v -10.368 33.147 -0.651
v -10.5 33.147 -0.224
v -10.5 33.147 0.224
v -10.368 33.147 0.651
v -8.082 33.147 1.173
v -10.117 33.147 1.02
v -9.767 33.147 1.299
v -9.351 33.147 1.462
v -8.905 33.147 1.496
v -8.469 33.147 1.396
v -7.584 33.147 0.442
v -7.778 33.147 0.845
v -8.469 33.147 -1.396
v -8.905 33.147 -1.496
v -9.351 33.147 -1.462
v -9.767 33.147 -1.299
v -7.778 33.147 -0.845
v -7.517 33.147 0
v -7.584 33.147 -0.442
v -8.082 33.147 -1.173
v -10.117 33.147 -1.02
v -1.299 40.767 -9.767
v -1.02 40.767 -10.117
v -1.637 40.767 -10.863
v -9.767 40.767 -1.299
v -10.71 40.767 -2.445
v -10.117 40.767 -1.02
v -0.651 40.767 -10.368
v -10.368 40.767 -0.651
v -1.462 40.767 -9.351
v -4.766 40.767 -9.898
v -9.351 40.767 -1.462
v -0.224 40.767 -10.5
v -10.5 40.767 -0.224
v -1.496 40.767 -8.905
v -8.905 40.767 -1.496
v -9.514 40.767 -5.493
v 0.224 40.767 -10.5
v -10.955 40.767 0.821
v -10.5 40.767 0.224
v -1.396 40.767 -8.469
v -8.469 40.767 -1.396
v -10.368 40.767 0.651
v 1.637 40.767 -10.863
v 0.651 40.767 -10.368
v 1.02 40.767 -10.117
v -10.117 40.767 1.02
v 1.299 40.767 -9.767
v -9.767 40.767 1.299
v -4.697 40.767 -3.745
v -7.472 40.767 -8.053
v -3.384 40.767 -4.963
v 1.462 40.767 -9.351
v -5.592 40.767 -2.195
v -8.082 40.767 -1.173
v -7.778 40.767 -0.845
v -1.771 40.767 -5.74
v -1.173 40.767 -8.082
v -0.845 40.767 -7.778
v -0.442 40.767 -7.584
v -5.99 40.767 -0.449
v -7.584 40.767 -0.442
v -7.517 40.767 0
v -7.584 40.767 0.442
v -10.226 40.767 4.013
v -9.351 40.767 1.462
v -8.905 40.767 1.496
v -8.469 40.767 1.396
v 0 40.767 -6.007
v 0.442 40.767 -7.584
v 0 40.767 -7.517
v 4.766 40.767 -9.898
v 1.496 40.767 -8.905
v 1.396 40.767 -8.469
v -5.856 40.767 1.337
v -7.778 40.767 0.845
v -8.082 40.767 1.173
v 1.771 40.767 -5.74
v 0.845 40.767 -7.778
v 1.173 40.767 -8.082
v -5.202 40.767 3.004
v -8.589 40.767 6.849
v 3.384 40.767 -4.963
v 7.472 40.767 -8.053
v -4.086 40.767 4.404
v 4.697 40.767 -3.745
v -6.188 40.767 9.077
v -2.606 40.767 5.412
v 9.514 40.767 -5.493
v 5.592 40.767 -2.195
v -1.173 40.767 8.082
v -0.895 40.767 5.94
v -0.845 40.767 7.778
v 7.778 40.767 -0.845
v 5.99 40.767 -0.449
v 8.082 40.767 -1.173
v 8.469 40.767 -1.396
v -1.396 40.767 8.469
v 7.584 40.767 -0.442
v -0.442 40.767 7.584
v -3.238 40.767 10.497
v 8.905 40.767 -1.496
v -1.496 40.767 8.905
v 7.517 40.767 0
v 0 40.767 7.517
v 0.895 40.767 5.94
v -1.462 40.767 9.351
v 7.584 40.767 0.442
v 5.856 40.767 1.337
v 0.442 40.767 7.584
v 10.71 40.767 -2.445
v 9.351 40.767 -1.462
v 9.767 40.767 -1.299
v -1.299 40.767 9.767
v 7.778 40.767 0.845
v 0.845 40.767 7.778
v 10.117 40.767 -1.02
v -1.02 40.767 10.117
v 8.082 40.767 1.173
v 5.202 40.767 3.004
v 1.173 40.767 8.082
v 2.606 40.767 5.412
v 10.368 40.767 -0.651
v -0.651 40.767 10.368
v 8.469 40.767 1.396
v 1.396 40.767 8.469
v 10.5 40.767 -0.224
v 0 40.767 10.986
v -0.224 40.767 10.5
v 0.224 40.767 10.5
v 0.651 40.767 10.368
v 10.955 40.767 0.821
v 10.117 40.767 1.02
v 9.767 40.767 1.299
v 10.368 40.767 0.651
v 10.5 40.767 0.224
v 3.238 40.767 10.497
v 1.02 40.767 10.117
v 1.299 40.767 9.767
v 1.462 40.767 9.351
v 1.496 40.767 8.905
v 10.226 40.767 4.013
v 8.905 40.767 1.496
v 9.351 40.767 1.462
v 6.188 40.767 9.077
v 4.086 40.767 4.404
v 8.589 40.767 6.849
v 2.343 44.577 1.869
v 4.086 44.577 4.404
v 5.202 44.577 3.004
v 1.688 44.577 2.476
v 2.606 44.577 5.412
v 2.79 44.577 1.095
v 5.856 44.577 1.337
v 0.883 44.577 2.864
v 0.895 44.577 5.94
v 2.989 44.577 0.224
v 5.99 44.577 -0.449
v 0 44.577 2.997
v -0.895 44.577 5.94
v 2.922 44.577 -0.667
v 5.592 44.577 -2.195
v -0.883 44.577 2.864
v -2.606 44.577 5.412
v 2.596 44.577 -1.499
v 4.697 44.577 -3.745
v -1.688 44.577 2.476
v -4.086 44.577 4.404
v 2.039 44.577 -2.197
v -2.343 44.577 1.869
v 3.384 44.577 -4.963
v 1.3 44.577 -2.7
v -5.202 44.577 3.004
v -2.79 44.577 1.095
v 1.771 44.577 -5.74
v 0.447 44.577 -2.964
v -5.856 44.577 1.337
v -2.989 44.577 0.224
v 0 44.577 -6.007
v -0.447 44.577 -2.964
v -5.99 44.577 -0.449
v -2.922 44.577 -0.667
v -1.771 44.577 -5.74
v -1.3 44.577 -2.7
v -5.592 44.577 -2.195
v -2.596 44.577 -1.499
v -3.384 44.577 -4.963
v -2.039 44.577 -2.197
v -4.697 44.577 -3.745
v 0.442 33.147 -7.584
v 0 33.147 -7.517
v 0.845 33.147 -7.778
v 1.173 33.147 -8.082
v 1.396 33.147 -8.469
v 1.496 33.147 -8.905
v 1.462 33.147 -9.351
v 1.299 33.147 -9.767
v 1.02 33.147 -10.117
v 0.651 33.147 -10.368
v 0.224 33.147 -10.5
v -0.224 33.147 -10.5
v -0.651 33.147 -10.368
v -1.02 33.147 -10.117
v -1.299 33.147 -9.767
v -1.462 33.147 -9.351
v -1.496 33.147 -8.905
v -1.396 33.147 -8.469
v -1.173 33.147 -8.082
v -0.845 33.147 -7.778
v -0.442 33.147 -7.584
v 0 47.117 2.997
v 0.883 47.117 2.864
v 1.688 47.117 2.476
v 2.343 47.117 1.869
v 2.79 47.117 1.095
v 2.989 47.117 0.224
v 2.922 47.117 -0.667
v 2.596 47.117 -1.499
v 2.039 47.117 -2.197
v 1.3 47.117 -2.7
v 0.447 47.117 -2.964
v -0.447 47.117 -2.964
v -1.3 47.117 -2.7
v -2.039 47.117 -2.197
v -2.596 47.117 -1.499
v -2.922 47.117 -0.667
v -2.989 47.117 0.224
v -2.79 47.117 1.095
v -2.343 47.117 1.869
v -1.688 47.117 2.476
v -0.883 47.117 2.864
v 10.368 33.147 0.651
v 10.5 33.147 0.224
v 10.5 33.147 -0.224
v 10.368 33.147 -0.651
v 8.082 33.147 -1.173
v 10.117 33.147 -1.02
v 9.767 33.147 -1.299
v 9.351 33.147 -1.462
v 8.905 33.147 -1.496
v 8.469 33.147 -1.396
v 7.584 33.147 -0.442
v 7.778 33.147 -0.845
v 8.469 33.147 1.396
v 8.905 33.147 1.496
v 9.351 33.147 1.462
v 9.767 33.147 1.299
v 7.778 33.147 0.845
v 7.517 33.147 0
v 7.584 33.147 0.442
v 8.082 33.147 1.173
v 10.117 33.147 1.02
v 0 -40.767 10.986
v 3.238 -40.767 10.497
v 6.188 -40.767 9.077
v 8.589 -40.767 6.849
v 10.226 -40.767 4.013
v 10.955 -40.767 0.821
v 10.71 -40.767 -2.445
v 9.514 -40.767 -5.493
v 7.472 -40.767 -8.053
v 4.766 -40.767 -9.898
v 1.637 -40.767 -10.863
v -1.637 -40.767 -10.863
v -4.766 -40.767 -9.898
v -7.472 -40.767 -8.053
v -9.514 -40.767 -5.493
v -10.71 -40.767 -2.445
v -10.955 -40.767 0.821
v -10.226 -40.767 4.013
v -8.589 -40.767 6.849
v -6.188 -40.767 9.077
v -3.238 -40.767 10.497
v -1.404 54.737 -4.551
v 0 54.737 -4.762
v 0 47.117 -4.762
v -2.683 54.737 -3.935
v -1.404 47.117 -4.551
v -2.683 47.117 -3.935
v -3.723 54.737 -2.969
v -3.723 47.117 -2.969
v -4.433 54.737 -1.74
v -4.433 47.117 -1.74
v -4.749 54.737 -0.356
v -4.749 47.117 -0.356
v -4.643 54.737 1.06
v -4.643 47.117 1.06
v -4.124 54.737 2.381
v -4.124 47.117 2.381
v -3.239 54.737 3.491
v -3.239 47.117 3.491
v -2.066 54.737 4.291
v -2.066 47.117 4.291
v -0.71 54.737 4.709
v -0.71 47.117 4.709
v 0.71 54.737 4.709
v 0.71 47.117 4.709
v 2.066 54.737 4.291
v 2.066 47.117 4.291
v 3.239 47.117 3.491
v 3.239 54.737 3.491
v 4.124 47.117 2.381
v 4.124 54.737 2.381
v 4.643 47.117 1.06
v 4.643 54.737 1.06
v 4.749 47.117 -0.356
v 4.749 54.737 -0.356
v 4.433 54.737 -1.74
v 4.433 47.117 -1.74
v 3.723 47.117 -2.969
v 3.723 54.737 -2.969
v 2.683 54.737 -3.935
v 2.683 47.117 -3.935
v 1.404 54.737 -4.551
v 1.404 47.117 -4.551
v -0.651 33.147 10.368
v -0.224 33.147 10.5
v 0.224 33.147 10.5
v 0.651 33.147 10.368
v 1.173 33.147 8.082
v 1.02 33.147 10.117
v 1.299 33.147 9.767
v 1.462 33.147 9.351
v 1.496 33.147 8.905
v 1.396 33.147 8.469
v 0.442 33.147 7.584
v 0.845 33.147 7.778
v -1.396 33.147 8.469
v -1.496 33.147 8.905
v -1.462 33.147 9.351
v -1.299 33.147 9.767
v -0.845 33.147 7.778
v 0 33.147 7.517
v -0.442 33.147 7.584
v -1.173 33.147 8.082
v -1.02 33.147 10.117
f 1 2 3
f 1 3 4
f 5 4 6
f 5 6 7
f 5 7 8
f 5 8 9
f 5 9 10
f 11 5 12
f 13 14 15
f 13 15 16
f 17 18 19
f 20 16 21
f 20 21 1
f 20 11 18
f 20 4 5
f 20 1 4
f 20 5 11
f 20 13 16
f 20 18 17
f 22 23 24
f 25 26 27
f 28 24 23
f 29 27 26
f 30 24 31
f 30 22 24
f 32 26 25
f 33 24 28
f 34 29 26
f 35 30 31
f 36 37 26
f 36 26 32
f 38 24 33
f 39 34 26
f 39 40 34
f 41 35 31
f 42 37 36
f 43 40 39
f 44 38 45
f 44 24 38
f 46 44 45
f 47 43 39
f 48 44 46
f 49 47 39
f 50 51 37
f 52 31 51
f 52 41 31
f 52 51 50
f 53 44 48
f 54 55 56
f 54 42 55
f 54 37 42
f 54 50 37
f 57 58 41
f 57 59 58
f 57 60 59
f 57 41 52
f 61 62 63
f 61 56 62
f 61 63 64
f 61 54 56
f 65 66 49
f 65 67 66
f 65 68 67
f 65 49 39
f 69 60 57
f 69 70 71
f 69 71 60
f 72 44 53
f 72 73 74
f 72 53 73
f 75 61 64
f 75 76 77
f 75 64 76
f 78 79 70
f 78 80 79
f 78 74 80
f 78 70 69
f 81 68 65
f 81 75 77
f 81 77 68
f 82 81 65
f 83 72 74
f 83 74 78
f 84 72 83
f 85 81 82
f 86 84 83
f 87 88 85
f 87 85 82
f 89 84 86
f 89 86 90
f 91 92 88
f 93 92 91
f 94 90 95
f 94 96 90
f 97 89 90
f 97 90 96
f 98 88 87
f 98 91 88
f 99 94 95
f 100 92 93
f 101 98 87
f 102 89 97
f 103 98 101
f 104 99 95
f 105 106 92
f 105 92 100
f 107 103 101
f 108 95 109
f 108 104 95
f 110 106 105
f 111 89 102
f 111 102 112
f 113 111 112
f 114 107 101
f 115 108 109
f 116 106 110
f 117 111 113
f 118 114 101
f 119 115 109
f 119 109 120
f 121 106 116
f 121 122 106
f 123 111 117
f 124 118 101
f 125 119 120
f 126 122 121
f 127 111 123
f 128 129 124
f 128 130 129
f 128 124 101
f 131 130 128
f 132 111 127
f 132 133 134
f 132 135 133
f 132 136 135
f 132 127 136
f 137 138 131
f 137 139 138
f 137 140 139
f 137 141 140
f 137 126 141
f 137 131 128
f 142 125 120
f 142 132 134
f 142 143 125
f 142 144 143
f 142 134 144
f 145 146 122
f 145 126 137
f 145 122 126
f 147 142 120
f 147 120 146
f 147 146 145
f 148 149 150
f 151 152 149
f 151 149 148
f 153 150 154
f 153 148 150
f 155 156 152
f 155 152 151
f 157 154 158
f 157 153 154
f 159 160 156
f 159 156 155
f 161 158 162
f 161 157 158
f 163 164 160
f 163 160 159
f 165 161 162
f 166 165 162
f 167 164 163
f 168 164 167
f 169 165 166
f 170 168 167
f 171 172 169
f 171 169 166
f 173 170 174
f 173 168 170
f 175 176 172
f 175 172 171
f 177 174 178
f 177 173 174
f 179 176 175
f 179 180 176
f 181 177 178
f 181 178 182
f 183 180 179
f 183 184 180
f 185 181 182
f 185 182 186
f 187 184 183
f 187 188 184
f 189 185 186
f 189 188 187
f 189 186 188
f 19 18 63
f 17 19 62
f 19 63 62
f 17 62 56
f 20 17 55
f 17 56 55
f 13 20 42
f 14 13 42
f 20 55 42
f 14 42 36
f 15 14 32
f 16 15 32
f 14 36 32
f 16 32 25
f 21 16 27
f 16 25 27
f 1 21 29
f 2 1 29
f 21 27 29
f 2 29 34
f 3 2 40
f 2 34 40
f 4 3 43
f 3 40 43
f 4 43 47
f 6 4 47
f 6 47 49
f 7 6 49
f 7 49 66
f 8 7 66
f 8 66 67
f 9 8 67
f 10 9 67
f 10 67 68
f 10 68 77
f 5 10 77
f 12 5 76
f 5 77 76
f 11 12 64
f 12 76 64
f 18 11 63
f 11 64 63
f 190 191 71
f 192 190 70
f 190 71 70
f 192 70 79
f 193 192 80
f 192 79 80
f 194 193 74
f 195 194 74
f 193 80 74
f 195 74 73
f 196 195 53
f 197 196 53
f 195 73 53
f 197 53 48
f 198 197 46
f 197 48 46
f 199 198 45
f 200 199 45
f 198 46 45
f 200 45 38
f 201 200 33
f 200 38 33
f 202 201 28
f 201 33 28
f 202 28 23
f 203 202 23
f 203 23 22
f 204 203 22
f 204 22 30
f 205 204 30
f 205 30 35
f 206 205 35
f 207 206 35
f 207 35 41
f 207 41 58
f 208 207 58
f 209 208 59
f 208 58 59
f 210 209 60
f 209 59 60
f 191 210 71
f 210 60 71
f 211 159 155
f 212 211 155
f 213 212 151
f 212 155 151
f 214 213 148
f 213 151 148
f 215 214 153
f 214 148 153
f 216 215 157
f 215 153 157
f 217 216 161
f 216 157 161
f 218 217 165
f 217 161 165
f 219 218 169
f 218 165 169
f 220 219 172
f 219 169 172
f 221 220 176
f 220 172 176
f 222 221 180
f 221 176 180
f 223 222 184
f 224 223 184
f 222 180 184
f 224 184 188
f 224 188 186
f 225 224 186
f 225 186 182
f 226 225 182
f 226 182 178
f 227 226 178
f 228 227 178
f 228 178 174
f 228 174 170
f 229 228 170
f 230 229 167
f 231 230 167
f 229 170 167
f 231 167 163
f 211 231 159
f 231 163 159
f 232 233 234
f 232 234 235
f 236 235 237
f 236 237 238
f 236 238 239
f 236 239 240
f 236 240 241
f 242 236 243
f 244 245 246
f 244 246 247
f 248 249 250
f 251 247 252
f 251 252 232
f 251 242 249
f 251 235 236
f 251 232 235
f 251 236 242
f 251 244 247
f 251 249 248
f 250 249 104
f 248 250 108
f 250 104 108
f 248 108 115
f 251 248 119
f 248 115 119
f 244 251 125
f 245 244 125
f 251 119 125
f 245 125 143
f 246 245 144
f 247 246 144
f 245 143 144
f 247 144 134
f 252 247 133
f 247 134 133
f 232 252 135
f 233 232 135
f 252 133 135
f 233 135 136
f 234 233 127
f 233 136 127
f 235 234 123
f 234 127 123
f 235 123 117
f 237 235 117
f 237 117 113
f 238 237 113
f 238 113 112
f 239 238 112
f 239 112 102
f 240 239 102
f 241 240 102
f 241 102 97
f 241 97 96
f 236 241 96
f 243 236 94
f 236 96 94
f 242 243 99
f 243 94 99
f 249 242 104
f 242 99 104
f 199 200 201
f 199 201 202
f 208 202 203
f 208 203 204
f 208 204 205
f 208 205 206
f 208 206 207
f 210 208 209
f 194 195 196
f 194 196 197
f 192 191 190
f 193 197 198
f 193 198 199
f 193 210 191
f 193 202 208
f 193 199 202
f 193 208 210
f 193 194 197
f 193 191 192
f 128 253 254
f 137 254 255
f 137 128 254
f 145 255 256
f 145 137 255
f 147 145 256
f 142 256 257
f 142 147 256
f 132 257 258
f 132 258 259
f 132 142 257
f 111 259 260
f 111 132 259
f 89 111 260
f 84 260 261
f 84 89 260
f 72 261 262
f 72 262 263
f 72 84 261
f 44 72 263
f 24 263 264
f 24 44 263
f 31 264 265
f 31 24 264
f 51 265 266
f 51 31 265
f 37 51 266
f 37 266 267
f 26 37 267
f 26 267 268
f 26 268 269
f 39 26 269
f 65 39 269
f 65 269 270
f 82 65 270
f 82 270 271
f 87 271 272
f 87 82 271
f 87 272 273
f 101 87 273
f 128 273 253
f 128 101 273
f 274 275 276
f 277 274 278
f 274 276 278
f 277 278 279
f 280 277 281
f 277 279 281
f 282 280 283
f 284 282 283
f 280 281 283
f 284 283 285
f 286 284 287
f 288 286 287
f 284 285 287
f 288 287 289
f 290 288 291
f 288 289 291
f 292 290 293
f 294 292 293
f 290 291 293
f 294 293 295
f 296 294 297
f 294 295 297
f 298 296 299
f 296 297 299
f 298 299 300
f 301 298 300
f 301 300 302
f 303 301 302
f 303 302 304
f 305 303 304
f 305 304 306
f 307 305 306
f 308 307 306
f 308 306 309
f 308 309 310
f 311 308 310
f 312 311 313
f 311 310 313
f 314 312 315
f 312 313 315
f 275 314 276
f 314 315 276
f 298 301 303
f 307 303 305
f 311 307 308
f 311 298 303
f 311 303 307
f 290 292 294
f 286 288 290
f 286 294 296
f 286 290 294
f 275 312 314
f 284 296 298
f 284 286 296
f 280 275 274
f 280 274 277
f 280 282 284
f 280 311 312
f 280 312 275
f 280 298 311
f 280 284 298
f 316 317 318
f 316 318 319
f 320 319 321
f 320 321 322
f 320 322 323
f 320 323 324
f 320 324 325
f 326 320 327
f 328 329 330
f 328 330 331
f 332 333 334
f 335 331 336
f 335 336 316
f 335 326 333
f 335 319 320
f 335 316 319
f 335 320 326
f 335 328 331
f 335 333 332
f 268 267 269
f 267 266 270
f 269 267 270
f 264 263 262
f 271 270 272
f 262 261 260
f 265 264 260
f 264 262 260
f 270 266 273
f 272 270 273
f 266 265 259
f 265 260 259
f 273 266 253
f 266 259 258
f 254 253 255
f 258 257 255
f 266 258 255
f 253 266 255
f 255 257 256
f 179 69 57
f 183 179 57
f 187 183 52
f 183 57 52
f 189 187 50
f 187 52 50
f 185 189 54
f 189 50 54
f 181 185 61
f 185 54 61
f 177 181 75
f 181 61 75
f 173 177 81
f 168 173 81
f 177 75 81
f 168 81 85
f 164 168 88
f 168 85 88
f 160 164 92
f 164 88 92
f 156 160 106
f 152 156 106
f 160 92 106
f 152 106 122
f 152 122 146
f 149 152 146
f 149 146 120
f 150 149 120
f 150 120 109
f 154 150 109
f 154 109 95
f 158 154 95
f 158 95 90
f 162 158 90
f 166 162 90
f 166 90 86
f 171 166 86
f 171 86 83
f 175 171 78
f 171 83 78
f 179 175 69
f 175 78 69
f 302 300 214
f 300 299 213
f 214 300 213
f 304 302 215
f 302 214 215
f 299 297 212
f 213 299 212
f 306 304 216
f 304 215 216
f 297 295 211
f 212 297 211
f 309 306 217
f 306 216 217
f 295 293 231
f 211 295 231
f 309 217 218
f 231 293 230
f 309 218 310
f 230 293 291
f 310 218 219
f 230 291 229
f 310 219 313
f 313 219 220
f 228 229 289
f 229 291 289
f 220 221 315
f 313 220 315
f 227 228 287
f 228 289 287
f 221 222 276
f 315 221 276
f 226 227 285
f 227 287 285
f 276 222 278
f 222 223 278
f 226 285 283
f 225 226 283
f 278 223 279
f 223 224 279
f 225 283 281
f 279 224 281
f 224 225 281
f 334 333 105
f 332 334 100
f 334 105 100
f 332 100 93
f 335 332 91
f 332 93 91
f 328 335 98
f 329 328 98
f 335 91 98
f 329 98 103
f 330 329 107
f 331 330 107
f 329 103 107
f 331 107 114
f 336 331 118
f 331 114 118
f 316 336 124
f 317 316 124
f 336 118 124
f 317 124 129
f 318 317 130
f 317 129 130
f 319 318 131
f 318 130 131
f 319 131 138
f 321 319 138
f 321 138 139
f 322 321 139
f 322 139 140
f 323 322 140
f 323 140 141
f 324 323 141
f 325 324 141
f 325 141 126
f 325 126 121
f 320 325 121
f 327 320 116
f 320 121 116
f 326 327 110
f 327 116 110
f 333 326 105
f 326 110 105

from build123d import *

# Parameters (mm, degrees)
SKETCH1_R           = 10.9855
BOSS_EXTRUDE1_DEPTH = 40.767
SKETCH2_R           = 6.0071
BOSS_EXTRUDE2_DEPTH = 3.81
SKETCH3_R           = 2.9972
BOSS_EXTRUDE3_DEPTH = 2.54
SKETCH4_R           = 4.7625
BOSS_EXTRUDE4_DEPTH = 7.62
SKETCH5_R           = 1.5
CUT_EXTRUDE1_DEPTH  = 7.62
CIRPATTERN1_COUNT   = 4


with BuildPart() as part:
    # Sketch1 → Boss-Extrude1 (new, symmetric)
    with BuildSketch(Plane(origin=(0, 0, 0), x_dir=(1, 0, 0), z_dir=(0, 1, 0))):
        with Locations(Location((0, 0, 0), (0, 0, 270))):
            Circle(SKETCH1_R)
    extrude(amount=BOSS_EXTRUDE1_DEPTH, both=True)

    # Sketch2 → Boss-Extrude2 (add)
    with BuildSketch(Plane(origin=(0, 40.767, 0), x_dir=(1, 0, 0), z_dir=(0, 1, 0))):
        with Locations(Location((0, 0, 0), (0, 0, 90))):
            Circle(SKETCH2_R)
    extrude(amount=BOSS_EXTRUDE2_DEPTH)

    # Sketch3 → Boss-Extrude3 (add)
    with BuildSketch(Plane(origin=(0, 44.577, 0), x_dir=(1, 0, 0), z_dir=(0, 1, 0))):
        with Locations(Location((0, 0, 0), (0, 0, 270))):
            Circle(SKETCH3_R)
    extrude(amount=BOSS_EXTRUDE3_DEPTH)

    # Sketch4 → Boss-Extrude4 (add)
    with BuildSketch(Plane(origin=(0, 47.117, 0), x_dir=(1, 0, 0), z_dir=(0, 1, 0))):
        with Locations(Location((0, 0, 0), (0, 0, 90))):
            Circle(SKETCH4_R)
    extrude(amount=BOSS_EXTRUDE4_DEPTH)

    # Sketch5 → Cut-Extrude1 (cut)
    with BuildSketch(Plane(origin=(0, 40.767, 0), x_dir=(1, 0, 0), z_dir=(0, 1, 0))):
        with Locations(Location((0, 9.017, 0), (0, 0, 270))):
            Circle(SKETCH5_R)
    cut_extrude1 = extrude(amount=-CUT_EXTRUDE1_DEPTH, mode=Mode.SUBTRACT)

    # CirPattern1: Cut-Extrude1 ×4 about axis
    cirpattern1_axis = Axis((0, 0, 0), (0, 1, 0))
    for i in range(1, CIRPATTERN1_COUNT):
        add(cut_extrude1.rotate(cirpattern1_axis, i * 360 / CIRPATTERN1_COUNT), mode=Mode.SUBTRACT)


solid = part.part
